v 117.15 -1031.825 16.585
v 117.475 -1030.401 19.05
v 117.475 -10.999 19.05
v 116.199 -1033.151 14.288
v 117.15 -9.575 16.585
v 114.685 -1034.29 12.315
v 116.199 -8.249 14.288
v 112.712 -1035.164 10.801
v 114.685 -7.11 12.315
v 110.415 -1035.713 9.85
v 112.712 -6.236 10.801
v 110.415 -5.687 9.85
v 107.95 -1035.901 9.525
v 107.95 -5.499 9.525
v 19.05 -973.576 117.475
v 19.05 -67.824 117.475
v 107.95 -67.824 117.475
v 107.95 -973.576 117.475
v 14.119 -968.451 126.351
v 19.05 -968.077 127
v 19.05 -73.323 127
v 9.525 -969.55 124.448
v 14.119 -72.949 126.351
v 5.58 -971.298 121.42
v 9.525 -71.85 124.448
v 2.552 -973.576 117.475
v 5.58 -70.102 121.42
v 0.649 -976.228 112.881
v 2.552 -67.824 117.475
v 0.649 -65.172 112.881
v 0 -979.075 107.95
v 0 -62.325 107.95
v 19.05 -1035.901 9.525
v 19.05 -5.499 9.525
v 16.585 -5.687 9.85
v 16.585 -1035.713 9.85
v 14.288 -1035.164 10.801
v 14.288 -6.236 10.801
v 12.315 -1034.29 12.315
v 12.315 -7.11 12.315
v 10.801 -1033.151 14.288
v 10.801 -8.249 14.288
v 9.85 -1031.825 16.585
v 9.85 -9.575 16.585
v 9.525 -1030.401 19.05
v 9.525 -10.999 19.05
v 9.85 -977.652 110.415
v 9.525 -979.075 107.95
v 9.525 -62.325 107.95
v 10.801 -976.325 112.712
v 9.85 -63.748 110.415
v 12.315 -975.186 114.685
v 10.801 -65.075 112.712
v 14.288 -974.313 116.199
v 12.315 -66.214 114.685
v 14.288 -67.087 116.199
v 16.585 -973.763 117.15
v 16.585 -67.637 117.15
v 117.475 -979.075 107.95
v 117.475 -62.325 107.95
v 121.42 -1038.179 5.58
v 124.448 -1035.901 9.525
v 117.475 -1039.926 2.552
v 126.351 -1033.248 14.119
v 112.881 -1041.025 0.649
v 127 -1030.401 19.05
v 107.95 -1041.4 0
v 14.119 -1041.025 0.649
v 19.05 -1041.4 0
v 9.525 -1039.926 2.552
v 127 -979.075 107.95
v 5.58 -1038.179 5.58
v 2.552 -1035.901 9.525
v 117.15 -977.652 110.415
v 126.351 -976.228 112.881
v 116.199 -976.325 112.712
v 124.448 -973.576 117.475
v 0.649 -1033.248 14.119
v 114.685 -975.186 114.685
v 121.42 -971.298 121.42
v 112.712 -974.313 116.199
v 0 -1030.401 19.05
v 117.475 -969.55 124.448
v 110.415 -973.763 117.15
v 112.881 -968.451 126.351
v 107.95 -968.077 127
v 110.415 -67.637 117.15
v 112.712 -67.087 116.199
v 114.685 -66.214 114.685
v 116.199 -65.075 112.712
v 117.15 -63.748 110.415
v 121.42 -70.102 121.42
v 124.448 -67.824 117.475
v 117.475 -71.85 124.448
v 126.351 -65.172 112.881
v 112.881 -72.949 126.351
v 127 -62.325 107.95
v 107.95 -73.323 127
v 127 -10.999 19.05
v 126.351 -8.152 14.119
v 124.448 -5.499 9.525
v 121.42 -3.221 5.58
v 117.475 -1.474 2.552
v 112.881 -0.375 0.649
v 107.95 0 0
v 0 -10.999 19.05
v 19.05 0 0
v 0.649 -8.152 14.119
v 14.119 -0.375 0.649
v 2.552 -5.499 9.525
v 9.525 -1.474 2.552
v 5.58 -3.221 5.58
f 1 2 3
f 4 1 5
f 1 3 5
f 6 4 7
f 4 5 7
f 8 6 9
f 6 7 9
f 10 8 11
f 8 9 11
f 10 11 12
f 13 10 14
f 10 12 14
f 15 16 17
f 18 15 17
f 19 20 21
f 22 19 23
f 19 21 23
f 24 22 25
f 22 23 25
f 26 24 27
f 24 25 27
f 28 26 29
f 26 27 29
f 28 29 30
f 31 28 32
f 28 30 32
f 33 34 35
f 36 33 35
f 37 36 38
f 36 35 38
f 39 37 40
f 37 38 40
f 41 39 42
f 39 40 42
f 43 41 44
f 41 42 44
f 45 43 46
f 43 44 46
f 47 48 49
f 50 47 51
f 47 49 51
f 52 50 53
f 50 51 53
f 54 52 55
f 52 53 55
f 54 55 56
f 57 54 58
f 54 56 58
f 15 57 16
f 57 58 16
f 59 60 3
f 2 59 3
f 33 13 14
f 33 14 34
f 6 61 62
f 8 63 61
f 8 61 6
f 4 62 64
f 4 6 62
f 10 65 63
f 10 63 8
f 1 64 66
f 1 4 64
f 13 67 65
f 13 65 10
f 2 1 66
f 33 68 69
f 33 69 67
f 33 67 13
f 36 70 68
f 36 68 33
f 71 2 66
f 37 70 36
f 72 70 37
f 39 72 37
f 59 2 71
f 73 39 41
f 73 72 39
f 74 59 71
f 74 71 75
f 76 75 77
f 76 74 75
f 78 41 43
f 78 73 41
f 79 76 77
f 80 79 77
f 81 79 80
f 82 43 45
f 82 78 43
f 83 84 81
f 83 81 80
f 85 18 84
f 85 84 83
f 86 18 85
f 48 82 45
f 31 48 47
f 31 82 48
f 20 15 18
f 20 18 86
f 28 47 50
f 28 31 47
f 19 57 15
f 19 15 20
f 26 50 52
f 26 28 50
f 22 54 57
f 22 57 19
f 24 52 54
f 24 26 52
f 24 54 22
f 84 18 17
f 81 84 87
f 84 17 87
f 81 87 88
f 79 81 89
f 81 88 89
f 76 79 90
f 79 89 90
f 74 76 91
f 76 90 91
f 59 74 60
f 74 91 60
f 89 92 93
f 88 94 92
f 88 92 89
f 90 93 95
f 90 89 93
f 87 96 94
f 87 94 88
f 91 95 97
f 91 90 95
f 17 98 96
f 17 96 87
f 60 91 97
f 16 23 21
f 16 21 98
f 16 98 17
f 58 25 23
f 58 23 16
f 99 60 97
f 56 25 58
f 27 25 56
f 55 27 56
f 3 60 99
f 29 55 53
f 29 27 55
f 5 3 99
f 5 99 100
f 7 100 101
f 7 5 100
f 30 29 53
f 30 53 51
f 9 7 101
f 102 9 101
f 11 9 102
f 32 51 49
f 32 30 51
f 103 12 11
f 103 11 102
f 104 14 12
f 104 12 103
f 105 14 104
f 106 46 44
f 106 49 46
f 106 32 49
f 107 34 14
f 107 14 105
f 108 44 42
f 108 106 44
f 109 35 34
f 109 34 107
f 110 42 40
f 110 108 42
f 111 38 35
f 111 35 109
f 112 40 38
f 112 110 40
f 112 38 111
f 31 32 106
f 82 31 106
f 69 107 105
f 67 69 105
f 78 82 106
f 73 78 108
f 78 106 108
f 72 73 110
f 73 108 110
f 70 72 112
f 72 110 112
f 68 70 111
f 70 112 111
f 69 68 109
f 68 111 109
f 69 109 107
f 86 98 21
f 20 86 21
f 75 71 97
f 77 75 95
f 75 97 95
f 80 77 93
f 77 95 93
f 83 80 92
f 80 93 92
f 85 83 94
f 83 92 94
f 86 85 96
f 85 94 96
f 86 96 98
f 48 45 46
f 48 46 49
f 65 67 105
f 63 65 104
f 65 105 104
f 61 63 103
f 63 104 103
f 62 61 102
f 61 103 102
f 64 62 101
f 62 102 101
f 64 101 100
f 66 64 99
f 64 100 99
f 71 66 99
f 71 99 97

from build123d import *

# Parameters (mm, degrees)
F1_DEPTH = 1041.4
F3_DEPTH = 127.001


# Not quite as in the source:
# - a feature names something its author has since deleted; it is built from what else it names


with BuildPart() as f1:
    # F0 (on Front) → F1 (new body)
    with BuildSketch(Plane.XZ):
        with BuildLine():
            ThreePointArc((0, 19.05), (5.5796158184, 5.5796158184), (19.05, 0))
            Line((19.05, 0), (107.95, 0))
            ThreePointArc((107.95, 0), (121.4203841816, 5.5796158184), (127, 19.05))
            Line((127, 19.05), (127, 107.95))
            ThreePointArc((127, 107.95), (121.4203841816, 121.4203841816), (107.95, 127))
            Line((107.95, 127), (19.05, 127))
            ThreePointArc((19.05, 127), (5.5796158184, 121.4203841816), (0, 107.95))
            Line((0, 107.95), (0, 19.05))
        make_face()
        with BuildLine():
            ThreePointArc((19.05, 9.525), (12.3148079092, 12.3148079092), (9.525, 19.05))
            Line((9.525, 19.05), (9.525, 107.95))
            ThreePointArc((9.525, 107.95), (12.3148079092, 114.6851920908), (19.05, 117.475))
            Line((19.05, 117.475), (107.95, 117.475))
            ThreePointArc((107.95, 117.475), (114.6851920908, 114.6851920908), (117.475, 107.95))
            Line((117.475, 107.95), (117.475, 19.05))
            ThreePointArc((117.475, 19.05), (114.6851920908, 12.3148079092), (107.95, 9.525))
            Line((107.95, 9.525), (19.05, 9.525))
        make_face(mode=Mode.SUBTRACT)
    extrude(amount=F1_DEPTH)

    # F2 (on Right) → F3 (cut, through all)
    with BuildSketch(Plane.YZ):
        Polygon((-1041.4, 19.05), (-1041.4, 0), (-968.0765158129, 127), (-1041.4, 127), (-1041.4, 107.95), align=None)
        Polygon((-73.3234841871, 127), (0, 0), (0, 19.05), (0, 107.95), (0, 127), align=None)
    extrude(amount=F3_DEPTH, mode=Mode.SUBTRACT)


solid = f1.part
